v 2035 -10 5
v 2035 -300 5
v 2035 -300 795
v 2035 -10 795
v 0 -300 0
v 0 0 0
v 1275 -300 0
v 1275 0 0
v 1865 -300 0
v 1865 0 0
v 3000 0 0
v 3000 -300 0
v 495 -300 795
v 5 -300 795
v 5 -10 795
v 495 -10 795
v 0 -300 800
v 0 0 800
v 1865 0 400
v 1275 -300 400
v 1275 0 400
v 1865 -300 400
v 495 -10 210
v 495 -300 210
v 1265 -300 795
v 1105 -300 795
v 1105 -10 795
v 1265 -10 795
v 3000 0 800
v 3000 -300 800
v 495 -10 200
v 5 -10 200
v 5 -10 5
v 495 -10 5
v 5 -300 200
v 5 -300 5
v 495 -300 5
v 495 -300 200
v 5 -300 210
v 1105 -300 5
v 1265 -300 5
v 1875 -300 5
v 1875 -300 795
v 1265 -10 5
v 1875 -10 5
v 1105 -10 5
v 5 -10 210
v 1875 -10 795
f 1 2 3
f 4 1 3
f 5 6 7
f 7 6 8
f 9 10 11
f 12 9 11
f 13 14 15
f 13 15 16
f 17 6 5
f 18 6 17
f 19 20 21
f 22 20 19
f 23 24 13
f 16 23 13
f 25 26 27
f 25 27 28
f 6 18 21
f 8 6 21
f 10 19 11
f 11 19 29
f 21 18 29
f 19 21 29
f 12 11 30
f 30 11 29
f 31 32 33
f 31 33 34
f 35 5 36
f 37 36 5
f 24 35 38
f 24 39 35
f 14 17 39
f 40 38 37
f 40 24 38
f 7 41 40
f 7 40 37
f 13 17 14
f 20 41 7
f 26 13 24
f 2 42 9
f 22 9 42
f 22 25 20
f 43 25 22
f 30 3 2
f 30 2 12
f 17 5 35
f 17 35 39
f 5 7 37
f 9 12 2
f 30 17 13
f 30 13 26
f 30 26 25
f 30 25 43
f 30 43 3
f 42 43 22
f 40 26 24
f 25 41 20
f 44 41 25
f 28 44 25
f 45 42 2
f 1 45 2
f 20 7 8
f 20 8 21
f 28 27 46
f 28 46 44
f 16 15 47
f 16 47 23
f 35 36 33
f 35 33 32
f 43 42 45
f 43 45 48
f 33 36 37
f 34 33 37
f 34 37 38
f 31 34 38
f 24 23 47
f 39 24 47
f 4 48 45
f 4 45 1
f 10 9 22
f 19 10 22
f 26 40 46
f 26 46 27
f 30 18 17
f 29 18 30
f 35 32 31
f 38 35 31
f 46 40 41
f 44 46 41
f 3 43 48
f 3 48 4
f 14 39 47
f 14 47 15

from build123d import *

# Parameters (mm, degrees)
F0_W     = 3000
F0_H     = 800
F1_DEPTH = 300
F2_W     = 490
F2_H     = 790
F3_DEPTH = 290
F4_W     = 160
F4_H     = 790
F5_DEPTH = 290
F6_W     = 590
F6_H     = 400
F7_DEPTH = 300.001
F8_W     = 25
F8_H     = 10
F8_W_2   = 440
F9_DEPTH = 290


with BuildPart() as f1:
    # F0 (on Front) → F1 (new body)
    with BuildSketch(Plane.XZ):
        with Locations((1500, 400)):
            Rectangle(F0_W, F0_H)
    extrude(amount=F1_DEPTH)

    # F2 (on face) → F3 (cut)
    with BuildSketch(Plane.XZ.offset(300)):
        with Locations((250, 400)):
            Rectangle(F2_W, F2_H)
    extrude(amount=-F3_DEPTH, mode=Mode.SUBTRACT)

    # F4 (on face) → F5 (cut)
    with BuildSketch(Plane.XZ.offset(300)):
        with Locations((1185, 400)):
            Rectangle(F4_W, F4_H)
        with Locations((1955, 400)):
            Rectangle(F4_W, F4_H)
    extrude(amount=-F5_DEPTH, mode=Mode.SUBTRACT)

    # F6 (on face) → F7 (cut, through all)
    with BuildSketch(Plane.XZ.offset(300)):
        with Locations((1570, 200)):
            Rectangle(F6_W, F6_H)
    extrude(amount=-F7_DEPTH, mode=Mode.SUBTRACT)

    # F8 (on face) → F9 (join, through all)
    with BuildSketch(Plane.XZ.offset(10)):
        with Locations((17.5, 205)):
            Rectangle(F8_W, F8_H)
        with Locations((42.5, 205)):
            Rectangle(F8_W, F8_H)
        with Locations((275, 205)):
            Rectangle(F8_W_2, F8_H)
        with Locations((507.5, 205)):
            Rectangle(F8_W, F8_H)
        with Locations((532.5, 205)):
            Rectangle(F8_W, F8_H)
    extrude(amount=F9_DEPTH)


solid = f1.part
